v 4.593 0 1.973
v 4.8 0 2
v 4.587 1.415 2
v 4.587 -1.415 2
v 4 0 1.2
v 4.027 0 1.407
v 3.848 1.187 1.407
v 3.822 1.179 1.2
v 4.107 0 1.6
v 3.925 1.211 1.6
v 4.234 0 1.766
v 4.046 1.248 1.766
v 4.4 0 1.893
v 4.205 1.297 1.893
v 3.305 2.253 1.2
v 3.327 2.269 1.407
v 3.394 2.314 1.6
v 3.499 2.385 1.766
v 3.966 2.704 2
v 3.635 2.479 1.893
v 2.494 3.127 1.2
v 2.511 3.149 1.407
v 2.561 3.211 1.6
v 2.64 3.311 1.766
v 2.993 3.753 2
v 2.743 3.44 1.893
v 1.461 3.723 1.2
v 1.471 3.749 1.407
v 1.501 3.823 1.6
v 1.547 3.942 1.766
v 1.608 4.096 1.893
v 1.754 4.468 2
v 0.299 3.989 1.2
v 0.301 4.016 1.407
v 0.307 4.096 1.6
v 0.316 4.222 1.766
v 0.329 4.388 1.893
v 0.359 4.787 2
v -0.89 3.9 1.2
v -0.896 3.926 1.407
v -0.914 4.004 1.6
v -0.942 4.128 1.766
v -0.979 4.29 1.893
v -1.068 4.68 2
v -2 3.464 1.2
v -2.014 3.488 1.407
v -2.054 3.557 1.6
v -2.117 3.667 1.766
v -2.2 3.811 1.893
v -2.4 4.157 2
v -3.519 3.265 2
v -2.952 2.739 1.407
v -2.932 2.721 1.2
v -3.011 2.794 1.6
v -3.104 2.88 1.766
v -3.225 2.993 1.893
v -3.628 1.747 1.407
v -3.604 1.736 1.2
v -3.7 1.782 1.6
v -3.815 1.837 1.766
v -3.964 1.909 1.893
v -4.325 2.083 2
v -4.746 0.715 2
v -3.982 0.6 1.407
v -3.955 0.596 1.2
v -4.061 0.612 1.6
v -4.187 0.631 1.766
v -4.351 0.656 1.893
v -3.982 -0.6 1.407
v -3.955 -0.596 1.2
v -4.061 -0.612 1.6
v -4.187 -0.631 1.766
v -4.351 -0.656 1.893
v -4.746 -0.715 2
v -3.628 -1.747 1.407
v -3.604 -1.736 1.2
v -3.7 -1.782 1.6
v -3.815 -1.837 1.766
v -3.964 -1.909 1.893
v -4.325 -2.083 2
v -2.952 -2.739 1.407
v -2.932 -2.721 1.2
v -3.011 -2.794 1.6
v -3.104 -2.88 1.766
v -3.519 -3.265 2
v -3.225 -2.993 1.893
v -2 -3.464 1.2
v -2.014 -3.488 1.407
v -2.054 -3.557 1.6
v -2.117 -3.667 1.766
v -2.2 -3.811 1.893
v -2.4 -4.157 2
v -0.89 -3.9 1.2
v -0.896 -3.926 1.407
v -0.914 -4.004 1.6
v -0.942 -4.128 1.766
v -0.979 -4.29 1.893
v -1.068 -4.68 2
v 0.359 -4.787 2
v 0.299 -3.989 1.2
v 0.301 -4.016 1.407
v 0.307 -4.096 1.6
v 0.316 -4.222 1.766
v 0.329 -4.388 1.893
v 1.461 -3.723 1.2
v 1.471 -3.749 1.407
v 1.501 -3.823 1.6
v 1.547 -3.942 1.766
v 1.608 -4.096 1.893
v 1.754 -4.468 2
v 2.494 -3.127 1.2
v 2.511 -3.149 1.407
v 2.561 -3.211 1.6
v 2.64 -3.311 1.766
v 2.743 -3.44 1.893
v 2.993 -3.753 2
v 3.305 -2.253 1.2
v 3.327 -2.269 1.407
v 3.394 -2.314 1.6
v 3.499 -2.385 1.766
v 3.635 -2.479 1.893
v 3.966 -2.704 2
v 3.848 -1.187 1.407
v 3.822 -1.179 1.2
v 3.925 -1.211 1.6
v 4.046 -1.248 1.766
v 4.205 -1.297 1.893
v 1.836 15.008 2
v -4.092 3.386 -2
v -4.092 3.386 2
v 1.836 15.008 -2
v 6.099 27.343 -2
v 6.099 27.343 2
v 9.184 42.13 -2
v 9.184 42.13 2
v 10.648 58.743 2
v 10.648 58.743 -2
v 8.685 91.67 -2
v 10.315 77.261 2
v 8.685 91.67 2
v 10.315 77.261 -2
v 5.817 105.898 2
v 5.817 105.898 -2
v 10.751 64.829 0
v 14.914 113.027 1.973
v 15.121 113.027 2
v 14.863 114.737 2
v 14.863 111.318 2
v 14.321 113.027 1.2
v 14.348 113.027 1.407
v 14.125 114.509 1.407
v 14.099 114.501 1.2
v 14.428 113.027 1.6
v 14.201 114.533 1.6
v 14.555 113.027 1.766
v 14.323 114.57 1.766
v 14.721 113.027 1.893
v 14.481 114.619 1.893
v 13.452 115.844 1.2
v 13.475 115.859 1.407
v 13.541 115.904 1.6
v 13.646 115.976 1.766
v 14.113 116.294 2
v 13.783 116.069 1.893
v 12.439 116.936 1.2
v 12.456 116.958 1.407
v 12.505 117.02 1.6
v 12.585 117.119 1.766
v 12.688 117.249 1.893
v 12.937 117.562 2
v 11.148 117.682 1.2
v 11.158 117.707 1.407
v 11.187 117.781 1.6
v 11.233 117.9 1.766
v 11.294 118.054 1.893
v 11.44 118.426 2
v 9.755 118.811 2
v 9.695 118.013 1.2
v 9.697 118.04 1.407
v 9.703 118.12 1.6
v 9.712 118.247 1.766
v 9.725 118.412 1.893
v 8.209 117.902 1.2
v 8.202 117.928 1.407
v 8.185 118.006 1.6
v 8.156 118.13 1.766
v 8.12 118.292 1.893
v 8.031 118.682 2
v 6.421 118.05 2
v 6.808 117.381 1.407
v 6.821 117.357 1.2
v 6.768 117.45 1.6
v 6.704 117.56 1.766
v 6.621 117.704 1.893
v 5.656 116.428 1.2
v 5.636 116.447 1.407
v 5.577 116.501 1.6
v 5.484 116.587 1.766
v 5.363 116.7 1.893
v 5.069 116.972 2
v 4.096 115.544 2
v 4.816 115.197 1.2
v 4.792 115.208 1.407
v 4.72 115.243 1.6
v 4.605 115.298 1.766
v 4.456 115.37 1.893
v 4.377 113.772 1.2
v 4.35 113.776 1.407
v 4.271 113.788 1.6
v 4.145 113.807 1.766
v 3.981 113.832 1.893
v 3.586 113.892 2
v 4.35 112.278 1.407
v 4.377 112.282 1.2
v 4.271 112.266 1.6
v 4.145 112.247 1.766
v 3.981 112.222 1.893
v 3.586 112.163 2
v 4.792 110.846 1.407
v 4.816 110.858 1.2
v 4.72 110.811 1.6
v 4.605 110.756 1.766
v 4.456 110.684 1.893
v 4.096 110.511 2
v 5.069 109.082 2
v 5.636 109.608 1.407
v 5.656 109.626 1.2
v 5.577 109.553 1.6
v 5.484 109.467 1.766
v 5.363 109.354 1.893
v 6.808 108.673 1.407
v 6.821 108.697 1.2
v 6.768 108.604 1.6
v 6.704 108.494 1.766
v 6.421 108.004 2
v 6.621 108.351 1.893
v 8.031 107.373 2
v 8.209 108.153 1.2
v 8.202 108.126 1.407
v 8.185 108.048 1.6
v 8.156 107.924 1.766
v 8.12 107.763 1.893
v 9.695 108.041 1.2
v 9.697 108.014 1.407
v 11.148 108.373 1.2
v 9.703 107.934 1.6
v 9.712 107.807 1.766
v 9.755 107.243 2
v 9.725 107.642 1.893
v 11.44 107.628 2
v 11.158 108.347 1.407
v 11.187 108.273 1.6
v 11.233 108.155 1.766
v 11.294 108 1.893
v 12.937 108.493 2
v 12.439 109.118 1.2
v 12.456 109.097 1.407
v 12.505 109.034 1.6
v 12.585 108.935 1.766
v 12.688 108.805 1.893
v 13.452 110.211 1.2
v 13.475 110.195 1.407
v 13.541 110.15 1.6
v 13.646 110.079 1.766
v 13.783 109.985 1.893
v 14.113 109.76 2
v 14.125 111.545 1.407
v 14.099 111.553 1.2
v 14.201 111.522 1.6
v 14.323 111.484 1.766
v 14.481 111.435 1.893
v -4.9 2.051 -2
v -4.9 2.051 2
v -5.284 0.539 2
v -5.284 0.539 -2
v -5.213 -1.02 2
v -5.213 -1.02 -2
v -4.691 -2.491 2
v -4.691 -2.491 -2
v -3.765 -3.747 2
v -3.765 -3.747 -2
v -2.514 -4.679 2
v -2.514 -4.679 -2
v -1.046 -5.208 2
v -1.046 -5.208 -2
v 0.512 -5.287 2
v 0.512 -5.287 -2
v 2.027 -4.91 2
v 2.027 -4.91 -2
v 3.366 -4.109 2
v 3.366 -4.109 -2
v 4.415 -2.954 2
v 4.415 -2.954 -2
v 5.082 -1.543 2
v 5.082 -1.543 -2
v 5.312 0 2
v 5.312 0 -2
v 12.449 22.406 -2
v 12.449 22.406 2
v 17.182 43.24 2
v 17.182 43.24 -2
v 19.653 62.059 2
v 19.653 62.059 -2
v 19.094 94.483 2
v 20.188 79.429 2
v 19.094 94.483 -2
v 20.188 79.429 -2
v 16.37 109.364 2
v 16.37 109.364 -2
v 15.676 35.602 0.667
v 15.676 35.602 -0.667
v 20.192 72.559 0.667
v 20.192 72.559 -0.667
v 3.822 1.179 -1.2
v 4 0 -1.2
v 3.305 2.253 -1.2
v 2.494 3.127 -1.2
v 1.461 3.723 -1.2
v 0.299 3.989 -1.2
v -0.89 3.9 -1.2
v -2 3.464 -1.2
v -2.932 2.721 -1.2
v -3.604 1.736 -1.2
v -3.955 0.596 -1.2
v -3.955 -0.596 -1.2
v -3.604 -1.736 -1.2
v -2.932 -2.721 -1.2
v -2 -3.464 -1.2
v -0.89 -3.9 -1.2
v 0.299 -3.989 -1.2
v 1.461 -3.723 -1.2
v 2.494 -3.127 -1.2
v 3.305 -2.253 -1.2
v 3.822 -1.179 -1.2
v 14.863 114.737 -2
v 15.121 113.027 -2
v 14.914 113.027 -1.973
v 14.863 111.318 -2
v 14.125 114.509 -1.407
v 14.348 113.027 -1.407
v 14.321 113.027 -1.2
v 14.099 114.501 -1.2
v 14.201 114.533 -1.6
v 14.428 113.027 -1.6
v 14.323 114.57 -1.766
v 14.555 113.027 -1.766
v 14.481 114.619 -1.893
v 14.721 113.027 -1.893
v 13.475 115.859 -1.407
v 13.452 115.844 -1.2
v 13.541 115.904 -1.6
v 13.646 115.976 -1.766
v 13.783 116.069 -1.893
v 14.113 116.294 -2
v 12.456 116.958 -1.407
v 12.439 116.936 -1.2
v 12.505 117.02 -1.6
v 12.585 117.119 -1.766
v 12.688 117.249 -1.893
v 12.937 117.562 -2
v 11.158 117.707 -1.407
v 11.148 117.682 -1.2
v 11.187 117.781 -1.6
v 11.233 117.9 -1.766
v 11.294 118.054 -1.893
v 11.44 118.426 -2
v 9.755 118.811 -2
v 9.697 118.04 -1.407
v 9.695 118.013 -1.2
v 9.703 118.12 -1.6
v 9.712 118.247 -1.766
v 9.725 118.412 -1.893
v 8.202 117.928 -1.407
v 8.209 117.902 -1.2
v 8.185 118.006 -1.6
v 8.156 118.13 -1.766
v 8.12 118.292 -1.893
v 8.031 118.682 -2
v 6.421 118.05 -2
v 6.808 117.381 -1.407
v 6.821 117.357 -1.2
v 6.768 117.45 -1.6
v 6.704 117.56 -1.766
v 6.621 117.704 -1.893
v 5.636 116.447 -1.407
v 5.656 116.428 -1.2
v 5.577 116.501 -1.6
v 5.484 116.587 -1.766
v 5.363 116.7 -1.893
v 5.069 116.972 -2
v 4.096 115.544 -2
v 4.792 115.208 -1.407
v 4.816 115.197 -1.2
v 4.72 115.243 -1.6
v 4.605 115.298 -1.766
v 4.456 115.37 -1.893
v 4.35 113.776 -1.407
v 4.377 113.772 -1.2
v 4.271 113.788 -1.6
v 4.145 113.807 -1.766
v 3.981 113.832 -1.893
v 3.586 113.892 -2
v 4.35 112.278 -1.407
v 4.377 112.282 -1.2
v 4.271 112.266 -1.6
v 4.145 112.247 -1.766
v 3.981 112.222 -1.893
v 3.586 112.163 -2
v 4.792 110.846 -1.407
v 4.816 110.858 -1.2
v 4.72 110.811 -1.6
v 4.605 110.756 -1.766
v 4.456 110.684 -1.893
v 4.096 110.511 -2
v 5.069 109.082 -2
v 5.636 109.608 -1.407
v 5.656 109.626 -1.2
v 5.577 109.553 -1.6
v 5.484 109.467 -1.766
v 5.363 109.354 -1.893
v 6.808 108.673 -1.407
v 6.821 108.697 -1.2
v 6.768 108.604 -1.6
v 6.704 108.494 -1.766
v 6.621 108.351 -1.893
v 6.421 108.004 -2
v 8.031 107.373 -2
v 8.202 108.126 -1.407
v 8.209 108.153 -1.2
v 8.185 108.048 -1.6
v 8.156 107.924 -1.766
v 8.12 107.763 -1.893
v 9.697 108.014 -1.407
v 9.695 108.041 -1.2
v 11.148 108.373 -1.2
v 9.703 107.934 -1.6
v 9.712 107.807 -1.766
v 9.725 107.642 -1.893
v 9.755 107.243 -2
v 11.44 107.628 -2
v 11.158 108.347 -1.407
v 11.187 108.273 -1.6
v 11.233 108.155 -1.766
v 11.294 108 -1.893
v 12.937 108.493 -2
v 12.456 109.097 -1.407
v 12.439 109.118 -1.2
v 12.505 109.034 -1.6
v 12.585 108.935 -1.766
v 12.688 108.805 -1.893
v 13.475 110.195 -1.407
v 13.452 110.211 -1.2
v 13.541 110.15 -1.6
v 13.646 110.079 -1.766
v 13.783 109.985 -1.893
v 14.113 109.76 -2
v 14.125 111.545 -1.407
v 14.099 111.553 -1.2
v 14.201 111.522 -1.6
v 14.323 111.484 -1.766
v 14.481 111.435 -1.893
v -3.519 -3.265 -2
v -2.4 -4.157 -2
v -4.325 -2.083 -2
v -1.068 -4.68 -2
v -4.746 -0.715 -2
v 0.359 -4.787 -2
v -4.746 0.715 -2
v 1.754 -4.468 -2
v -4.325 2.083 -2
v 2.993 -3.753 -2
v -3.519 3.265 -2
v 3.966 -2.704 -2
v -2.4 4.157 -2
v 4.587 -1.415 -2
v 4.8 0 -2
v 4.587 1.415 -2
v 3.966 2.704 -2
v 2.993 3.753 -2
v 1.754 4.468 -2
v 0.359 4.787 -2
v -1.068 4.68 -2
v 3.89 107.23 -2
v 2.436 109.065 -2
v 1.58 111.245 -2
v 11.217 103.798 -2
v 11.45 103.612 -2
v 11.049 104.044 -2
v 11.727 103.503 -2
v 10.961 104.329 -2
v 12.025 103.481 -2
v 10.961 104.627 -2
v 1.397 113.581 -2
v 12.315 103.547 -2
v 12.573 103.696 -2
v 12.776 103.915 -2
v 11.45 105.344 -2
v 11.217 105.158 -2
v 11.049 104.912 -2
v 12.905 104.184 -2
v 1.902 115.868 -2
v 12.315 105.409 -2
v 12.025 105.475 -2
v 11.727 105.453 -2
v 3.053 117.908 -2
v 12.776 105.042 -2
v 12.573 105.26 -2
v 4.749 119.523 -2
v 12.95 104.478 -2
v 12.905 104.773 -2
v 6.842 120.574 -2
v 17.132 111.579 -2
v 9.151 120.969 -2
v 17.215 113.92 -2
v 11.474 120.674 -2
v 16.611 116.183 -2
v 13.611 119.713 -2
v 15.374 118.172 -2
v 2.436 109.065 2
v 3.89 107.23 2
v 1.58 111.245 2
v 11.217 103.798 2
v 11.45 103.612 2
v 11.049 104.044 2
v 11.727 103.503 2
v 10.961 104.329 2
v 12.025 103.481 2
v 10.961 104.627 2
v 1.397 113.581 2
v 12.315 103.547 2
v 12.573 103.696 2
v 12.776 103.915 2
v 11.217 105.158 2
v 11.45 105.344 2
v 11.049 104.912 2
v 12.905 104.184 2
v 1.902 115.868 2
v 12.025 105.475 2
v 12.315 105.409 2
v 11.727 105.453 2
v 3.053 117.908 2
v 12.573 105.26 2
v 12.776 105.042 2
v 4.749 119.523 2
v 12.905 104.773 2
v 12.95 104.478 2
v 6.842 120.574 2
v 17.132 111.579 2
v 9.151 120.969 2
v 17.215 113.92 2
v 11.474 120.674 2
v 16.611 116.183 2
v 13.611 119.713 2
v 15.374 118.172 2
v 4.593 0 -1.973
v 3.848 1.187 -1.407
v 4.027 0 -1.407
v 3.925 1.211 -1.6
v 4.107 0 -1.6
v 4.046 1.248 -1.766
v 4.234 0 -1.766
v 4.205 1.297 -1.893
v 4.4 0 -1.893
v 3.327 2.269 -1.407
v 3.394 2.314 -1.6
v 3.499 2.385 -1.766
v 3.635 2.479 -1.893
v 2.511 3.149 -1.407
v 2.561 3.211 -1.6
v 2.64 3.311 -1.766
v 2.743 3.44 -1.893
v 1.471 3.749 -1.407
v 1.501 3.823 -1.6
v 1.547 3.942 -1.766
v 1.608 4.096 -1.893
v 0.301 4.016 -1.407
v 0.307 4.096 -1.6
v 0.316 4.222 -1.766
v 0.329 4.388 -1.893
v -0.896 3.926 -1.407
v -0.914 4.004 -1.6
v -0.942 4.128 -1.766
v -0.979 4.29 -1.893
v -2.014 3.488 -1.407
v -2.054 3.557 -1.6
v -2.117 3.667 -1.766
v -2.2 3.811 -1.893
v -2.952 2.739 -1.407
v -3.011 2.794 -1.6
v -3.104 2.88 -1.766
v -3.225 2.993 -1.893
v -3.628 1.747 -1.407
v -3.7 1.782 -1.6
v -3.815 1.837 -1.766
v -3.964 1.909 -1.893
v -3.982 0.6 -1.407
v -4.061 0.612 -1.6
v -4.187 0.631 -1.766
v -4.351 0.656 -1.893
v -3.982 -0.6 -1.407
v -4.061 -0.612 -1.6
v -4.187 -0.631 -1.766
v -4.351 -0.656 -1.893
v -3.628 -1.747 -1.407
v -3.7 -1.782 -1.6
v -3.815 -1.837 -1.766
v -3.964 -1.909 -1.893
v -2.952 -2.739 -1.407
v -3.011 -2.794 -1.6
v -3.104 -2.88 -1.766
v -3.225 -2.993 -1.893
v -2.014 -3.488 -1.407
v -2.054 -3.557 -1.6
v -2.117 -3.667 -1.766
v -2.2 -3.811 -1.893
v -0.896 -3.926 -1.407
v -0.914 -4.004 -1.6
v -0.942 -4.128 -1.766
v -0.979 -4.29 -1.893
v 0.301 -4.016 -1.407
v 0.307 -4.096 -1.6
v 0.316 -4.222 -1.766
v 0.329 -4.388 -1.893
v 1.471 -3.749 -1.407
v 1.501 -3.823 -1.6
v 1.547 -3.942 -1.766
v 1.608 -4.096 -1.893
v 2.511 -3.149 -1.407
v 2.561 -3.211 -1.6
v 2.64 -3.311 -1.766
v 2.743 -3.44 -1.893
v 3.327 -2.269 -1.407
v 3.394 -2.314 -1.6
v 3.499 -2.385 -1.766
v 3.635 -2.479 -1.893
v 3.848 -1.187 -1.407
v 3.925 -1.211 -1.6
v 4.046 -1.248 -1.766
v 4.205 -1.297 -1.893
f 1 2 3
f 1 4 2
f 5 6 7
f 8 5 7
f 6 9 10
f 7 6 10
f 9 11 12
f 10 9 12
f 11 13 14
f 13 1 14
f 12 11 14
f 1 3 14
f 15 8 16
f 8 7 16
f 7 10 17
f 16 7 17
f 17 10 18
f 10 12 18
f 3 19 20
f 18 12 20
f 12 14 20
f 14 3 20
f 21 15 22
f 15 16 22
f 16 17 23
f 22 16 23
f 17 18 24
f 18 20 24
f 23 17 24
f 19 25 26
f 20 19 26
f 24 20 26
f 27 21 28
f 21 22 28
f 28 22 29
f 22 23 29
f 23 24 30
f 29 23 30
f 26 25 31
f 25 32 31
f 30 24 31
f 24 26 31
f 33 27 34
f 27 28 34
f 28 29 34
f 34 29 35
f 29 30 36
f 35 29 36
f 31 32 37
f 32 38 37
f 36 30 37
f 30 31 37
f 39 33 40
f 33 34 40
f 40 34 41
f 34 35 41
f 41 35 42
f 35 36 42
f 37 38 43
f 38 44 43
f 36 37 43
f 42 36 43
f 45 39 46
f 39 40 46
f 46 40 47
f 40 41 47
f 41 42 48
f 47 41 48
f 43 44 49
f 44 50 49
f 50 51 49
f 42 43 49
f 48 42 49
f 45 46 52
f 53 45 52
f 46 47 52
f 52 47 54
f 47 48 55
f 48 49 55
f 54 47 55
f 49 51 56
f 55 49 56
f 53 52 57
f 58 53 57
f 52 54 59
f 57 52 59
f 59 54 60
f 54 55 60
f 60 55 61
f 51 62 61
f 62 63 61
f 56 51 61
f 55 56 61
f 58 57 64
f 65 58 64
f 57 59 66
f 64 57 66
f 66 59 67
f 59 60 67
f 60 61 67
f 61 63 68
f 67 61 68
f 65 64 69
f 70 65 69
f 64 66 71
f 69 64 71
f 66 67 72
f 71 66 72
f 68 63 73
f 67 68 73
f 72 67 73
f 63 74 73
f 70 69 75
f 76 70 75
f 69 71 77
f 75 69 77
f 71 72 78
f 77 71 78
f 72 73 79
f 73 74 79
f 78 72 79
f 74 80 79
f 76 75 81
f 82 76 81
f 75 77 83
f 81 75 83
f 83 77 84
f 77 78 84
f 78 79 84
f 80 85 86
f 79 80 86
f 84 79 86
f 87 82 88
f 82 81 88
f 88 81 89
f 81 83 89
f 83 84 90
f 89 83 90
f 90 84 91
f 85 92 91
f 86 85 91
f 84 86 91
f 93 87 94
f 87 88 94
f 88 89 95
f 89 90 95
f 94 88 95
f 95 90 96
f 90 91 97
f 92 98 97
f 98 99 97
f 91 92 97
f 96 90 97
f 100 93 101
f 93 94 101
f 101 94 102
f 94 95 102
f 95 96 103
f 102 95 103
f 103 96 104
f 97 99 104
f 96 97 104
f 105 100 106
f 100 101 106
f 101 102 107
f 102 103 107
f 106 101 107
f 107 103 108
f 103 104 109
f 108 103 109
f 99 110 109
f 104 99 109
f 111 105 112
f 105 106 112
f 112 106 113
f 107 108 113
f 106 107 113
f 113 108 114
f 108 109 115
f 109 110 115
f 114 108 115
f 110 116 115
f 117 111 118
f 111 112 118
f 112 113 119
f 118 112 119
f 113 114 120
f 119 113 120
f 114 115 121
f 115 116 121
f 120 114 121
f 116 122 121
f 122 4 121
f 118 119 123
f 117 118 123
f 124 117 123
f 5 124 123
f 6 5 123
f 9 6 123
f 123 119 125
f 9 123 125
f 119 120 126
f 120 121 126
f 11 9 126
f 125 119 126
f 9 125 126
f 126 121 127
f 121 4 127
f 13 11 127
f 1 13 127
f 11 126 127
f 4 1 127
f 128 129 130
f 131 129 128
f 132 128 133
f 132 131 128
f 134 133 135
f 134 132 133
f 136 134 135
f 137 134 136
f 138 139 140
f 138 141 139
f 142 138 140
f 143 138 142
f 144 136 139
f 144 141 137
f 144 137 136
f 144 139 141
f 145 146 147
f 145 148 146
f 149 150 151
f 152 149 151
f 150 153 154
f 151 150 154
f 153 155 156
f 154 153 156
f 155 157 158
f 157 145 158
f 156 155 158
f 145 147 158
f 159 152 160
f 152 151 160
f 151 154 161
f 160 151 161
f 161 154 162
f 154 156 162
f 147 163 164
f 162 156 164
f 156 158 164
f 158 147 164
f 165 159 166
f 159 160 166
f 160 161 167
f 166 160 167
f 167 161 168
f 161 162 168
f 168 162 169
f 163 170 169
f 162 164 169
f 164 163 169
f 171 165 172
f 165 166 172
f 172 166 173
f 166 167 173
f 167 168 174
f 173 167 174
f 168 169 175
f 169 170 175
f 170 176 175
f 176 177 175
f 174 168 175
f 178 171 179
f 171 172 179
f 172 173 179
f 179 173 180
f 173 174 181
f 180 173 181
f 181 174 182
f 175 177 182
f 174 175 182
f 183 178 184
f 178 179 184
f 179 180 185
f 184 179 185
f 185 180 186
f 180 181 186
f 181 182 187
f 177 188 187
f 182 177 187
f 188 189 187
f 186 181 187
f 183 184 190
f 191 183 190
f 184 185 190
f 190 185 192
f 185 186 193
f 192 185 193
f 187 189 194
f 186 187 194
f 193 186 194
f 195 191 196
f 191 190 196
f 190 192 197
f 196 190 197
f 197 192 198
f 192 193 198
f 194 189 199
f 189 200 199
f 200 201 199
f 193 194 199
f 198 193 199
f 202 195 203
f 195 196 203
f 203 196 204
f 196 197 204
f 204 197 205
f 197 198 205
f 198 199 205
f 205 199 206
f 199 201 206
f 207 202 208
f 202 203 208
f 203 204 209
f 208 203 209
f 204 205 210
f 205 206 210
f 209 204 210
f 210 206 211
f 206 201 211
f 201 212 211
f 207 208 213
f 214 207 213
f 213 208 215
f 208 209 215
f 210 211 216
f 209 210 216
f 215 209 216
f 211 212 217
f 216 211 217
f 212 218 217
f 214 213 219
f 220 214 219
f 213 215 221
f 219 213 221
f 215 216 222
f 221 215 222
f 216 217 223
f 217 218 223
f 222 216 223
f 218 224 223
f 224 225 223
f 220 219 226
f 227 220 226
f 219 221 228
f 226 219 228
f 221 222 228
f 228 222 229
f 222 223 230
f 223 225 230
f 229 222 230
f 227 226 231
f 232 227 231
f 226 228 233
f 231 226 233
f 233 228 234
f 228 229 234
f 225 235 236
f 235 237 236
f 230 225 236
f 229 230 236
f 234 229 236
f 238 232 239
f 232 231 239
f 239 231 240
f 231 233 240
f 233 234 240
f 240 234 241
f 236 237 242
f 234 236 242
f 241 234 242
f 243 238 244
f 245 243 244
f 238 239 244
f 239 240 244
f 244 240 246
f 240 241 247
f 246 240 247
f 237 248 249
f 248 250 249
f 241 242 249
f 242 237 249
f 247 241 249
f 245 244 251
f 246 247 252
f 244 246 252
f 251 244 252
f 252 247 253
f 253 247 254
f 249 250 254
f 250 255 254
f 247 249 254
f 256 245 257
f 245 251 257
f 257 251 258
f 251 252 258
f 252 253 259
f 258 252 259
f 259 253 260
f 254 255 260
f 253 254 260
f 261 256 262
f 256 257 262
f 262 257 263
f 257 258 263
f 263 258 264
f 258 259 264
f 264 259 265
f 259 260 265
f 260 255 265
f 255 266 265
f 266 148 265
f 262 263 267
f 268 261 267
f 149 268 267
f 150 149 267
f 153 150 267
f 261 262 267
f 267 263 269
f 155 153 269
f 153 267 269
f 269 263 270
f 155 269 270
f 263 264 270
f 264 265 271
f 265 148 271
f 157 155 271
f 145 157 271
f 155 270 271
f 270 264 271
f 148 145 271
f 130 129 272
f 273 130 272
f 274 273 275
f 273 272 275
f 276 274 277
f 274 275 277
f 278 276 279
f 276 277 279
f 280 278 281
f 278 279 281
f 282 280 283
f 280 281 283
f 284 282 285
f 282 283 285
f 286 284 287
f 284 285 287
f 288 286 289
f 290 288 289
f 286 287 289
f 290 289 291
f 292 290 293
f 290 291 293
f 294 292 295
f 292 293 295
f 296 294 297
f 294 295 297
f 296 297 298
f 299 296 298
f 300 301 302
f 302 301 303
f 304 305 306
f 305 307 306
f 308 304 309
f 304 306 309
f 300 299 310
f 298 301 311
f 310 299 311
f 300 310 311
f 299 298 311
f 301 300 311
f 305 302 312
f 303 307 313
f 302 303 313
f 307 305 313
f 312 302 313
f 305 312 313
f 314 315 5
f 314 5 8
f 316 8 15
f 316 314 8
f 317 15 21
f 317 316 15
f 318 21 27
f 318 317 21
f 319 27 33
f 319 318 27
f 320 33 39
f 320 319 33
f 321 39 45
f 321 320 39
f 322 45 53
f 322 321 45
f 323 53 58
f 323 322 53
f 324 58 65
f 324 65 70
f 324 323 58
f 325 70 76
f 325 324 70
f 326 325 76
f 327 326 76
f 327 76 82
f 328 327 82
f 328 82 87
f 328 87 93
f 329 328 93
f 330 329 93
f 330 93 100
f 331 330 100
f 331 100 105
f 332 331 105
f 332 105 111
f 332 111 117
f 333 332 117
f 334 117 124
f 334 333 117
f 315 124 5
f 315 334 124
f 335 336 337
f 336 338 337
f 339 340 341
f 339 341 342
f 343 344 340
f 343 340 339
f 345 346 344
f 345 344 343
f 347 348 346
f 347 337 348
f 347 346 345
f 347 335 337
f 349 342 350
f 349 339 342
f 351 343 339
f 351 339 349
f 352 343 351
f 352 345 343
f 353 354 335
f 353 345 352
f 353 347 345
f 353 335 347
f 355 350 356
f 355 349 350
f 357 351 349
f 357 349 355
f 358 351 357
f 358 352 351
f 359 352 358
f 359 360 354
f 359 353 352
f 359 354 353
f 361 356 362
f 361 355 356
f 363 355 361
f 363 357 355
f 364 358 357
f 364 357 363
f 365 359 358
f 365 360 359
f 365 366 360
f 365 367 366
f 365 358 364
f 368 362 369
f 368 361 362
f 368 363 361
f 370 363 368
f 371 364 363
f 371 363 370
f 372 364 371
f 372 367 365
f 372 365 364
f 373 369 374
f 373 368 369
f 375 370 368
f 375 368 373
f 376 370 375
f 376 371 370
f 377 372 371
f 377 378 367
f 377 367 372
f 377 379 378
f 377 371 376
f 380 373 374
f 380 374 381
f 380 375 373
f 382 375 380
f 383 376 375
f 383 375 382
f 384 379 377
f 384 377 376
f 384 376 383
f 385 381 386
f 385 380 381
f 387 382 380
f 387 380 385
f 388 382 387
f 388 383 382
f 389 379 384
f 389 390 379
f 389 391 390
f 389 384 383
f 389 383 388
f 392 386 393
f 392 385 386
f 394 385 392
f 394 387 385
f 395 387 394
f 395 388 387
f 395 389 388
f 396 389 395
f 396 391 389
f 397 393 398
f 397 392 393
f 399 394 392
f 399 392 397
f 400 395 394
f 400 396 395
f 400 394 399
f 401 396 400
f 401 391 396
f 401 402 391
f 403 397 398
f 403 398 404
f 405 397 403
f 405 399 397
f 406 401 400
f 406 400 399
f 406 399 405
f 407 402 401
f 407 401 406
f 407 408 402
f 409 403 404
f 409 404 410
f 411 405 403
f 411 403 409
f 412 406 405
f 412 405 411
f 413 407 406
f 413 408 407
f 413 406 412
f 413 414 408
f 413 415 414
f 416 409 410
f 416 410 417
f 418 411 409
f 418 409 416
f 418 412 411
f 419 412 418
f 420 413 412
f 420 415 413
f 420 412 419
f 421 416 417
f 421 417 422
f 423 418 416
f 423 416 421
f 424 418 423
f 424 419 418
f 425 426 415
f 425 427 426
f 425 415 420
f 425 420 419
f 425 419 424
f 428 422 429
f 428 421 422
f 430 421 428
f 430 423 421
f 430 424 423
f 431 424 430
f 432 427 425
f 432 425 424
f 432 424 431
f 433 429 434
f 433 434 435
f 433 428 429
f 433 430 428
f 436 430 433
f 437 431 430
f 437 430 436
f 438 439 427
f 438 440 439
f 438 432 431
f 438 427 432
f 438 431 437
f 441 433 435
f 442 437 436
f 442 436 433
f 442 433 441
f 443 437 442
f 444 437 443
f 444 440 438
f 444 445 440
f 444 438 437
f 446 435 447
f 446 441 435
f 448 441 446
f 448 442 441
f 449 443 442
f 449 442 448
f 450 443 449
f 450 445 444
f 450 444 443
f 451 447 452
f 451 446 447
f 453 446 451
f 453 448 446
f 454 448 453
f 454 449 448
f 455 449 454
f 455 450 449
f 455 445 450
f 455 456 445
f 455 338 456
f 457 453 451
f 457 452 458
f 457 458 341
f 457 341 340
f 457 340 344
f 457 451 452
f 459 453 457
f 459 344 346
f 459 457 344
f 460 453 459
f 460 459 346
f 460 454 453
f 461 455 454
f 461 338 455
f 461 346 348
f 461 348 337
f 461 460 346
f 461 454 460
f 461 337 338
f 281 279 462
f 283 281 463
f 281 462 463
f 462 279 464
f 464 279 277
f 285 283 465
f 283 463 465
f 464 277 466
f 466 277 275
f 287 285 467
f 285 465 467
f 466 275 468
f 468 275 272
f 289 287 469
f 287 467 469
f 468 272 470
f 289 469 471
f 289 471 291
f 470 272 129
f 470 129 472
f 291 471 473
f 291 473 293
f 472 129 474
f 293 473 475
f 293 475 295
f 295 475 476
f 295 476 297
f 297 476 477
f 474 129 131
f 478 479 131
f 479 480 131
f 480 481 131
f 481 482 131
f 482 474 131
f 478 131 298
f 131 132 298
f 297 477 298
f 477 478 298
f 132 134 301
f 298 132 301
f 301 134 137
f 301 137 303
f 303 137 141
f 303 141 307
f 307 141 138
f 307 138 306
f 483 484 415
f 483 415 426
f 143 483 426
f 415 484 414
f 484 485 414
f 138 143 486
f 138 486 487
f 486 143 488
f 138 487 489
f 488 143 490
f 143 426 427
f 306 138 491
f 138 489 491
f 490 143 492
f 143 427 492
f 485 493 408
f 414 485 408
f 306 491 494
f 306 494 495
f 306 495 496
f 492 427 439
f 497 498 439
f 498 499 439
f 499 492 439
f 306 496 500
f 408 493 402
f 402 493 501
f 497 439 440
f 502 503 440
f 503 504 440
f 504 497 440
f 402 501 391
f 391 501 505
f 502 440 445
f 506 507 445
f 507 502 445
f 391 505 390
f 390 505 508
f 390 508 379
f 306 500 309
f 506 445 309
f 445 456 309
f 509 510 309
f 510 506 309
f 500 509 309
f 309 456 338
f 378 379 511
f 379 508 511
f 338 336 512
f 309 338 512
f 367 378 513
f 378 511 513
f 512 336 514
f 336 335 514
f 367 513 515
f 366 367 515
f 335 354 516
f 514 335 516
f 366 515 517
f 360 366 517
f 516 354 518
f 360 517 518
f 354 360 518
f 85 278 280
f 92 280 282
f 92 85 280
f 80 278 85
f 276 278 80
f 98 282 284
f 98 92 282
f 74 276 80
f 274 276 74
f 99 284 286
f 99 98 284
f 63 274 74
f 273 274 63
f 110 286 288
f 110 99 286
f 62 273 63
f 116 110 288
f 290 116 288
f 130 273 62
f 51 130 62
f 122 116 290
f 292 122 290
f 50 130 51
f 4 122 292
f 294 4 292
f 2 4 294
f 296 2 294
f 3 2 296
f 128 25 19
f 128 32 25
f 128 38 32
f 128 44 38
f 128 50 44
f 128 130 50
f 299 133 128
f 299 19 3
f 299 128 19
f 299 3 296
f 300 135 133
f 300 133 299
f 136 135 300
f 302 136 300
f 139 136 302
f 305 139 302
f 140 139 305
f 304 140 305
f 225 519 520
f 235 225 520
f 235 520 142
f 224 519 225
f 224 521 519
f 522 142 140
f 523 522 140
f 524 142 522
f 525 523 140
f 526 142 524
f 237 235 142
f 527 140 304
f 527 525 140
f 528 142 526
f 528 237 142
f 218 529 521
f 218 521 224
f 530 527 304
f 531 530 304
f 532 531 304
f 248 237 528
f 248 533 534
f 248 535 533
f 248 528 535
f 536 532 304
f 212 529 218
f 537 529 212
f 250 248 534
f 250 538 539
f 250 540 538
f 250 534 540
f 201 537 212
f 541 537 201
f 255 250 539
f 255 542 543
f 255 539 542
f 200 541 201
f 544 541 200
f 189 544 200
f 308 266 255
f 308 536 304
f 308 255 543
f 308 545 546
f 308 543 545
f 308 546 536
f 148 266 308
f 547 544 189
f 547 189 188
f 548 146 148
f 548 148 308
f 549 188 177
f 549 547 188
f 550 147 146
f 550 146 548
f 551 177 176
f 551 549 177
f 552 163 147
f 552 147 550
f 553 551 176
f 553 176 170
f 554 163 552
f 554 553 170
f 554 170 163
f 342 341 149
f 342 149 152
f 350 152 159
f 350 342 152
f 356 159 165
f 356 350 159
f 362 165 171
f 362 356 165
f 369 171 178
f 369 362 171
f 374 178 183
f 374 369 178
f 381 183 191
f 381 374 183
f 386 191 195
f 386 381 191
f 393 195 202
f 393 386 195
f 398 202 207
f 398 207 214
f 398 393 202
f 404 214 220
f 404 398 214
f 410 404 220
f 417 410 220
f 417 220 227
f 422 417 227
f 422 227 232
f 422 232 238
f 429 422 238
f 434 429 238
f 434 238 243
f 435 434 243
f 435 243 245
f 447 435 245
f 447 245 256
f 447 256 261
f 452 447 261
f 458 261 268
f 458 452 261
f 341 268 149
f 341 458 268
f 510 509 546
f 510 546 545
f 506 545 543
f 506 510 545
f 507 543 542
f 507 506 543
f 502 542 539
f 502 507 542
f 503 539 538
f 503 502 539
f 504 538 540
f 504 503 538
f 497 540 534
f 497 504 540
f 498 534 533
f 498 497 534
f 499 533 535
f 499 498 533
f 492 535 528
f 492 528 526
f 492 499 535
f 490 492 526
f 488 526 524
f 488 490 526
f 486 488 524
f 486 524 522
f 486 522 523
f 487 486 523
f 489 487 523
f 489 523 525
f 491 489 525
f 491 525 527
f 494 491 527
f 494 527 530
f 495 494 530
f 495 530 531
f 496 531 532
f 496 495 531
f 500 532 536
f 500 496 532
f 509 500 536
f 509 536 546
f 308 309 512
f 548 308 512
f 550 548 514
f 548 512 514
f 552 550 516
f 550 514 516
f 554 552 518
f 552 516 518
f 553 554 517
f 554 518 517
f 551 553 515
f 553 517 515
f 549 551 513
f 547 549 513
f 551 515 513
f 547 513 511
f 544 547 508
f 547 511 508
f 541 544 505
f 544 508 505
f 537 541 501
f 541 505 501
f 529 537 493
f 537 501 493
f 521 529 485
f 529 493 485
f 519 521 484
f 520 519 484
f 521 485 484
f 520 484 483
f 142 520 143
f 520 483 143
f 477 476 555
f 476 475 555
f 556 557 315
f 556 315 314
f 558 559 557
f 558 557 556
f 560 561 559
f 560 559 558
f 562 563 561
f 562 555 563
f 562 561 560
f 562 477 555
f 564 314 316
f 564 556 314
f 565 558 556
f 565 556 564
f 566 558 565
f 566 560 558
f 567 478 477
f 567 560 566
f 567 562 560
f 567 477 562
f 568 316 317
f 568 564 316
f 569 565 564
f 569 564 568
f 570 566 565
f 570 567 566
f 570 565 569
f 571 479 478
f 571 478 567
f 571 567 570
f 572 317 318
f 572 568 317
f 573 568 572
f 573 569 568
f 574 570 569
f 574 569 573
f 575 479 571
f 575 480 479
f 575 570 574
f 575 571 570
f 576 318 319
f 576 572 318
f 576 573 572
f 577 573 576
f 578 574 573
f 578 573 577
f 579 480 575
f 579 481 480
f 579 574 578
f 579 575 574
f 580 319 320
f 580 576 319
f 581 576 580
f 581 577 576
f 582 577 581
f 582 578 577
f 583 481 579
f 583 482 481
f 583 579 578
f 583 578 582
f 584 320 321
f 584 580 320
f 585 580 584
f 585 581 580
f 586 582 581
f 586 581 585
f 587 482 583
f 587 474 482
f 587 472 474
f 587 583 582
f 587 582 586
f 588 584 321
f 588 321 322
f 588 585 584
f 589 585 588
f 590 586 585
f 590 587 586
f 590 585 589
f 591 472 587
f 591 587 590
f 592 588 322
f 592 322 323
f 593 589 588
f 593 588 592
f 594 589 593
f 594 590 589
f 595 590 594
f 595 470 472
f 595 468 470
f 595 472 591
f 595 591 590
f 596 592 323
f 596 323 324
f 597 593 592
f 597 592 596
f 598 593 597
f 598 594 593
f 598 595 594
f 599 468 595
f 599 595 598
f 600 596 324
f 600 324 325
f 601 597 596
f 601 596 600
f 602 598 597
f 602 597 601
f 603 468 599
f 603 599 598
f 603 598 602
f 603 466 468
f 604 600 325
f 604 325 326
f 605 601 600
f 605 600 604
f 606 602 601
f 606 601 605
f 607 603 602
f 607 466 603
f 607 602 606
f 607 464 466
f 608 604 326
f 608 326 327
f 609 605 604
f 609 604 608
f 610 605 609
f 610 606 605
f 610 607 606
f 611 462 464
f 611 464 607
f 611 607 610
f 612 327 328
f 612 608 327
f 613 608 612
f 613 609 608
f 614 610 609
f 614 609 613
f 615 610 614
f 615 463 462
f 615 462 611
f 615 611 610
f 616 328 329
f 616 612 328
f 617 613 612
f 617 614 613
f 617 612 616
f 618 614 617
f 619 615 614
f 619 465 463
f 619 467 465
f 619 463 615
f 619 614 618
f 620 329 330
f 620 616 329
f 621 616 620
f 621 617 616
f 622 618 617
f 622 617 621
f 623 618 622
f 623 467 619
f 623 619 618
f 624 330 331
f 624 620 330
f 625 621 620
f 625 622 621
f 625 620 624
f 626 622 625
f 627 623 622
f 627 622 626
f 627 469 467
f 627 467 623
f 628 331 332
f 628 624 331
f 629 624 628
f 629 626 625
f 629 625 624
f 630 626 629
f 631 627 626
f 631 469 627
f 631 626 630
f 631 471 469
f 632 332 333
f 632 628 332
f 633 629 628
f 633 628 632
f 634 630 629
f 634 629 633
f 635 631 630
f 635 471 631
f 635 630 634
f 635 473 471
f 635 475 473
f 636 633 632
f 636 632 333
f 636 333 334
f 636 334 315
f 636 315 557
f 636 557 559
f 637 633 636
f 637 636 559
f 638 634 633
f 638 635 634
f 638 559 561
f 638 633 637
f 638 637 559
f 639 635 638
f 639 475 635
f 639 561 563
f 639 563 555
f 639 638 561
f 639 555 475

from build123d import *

# Parameters (mm, degrees)
SKETCH1_R           = 4
SKETCH1_R_2         = 1
SKETCH1_R_3         = 5
BOSS_EXTRUDE1_DEPTH = 2
FILLET1_R           = 0.8


with BuildPart() as part:
    # Sketch1 → Boss-Extrude1 (new, symmetric)
    with BuildSketch(Plane.XY):
        with BuildLine():
            ThreePointArc((-4.09240869, 3.386100226), (-1.799457661, -4.997542972), (5.311636624, 0))
            add(Edge.make_bspline(
                [(5.311636624, 0), (17.769363539, 34.421881869), (25.192042954, 73.13636609), (16.37011227, 109.364122199)],
                knots=[0, 0, 0, 0, 0.956773453, 0.956773453, 0.956773453, 0.956773453], degree=3))
            ThreePointArc((16.37011227, 109.364122199), (6.842083231, 120.574345754), (5.817157068, 105.897766593))
            add(Edge.make_bspline(
                [(-4.09240869, 3.386100226), (6.994812741, 21.577875377), (13.208144478, 57.701592599), (9.143863643, 92.456079954), (5.817157068, 105.897766593)],
                knots=[0, 0, 0, 0, 0.587614162, 0.97029995, 0.97029995, 0.97029995, 0.97029995], degree=3))
        make_face()
        Circle(SKETCH1_R, mode=Mode.SUBTRACT)
        with Locations((11.949864601, 104.478258332)):
            Circle(SKETCH1_R_2, mode=Mode.SUBTRACT)
        with Locations((9.321130613, 113.027146637)):
            Circle(SKETCH1_R_3, mode=Mode.SUBTRACT)
    extrude(amount=BOSS_EXTRUDE1_DEPTH, both=True)

    # Fillet1
    fillet1_edges = [part.edges().sort_by_distance(p)[0] for p in [
        (-4, 0, -2),
        (-4, 0, 2),
        (4.321130613, 113.027146637, -2),
        (4.321130613, 113.027146637, 2),
    ]]
    fillet(fillet1_edges, radius=FILLET1_R)


solid = part.part
